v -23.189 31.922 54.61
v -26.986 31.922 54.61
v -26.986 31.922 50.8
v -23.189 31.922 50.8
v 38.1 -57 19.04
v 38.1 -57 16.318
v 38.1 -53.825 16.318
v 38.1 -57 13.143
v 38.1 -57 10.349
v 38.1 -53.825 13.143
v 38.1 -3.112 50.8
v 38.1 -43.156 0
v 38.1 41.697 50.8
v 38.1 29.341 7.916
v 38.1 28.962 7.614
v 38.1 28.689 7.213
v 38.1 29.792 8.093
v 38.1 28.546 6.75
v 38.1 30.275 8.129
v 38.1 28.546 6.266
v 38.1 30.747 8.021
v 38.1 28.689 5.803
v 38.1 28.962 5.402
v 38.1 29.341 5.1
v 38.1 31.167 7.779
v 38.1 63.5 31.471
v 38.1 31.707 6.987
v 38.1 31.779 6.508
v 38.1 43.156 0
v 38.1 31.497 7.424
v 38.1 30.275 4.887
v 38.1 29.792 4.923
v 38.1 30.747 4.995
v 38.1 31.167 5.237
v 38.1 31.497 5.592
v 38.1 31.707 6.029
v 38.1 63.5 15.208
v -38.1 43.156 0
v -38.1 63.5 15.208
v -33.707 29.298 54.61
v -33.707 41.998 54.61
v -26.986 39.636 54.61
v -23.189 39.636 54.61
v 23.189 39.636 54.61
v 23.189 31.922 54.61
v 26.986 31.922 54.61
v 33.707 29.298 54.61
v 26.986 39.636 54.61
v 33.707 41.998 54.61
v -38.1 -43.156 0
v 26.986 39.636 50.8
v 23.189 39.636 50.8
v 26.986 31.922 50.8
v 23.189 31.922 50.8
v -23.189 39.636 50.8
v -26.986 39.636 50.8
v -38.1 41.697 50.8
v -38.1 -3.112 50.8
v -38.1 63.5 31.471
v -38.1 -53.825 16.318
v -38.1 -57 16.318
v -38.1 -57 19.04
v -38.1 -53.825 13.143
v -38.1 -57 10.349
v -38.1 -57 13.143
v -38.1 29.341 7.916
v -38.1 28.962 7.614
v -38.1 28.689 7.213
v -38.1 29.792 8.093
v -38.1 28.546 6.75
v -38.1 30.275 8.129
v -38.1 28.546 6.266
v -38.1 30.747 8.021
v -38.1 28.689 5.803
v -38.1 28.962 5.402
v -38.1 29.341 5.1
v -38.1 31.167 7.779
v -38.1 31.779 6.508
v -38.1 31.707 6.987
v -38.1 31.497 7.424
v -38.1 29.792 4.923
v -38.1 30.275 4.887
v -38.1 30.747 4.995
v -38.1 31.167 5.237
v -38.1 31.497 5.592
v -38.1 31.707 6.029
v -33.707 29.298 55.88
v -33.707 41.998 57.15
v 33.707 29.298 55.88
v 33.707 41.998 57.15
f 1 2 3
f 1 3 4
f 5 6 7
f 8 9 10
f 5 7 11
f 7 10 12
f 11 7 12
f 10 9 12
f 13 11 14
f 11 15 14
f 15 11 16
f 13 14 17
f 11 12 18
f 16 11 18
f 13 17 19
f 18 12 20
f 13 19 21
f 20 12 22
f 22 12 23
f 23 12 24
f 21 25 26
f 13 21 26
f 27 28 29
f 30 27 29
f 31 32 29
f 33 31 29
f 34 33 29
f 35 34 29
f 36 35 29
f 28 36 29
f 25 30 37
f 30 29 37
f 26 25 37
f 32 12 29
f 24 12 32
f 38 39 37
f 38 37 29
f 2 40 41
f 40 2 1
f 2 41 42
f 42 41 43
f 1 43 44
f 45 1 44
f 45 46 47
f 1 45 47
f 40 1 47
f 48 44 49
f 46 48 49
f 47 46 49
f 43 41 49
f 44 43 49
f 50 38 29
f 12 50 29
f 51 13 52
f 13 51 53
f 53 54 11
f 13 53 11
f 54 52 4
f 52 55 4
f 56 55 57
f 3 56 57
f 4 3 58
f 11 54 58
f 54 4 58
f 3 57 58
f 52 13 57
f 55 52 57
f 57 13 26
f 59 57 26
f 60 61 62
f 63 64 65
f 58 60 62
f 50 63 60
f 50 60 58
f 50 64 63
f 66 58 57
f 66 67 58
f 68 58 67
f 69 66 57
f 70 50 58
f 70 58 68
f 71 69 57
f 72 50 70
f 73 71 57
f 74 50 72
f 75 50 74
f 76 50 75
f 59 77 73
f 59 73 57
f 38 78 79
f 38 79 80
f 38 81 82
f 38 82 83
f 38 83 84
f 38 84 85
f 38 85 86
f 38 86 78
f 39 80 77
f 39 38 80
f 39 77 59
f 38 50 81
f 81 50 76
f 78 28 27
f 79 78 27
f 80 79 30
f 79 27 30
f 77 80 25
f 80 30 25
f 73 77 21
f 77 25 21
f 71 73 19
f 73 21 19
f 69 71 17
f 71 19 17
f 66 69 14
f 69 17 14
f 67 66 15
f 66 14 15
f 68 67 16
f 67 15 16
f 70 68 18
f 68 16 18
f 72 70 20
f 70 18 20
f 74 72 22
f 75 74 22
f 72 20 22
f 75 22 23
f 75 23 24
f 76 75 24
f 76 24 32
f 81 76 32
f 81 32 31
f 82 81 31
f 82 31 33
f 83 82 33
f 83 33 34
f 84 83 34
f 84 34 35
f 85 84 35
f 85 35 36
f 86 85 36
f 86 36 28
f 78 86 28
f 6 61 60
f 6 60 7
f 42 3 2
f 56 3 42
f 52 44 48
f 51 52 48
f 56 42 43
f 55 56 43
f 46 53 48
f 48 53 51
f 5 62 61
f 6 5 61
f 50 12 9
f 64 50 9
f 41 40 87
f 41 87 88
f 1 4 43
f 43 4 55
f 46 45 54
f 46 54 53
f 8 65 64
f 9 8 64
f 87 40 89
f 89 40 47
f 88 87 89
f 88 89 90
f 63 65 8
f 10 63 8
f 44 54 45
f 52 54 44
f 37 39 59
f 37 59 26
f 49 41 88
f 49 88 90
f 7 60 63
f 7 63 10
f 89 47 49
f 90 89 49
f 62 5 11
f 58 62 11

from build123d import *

# Parameters (mm, degrees)
F0_W      = 76.2
F0_H      = 127
F1_DEPTH  = 25.4
F2_W      = 76.2
F2_H      = 60.3884999398
F3_DEPTH  = 25.4
F5_DEPTH  = 25.4
F7_W      = 3.7973541766
F7_H      = 7.7133737504
F8_DEPTH  = 3.81
F9_W      = 67.4144178629
F9_H      = 12.7
F10_DEPTH = 2.54
F11_DEPTH = 25.4
F13_DEPTH = 119.38
F14_DEPTH = 157.988
F16_DEPTH = 160.7312
F18_DEPTH = 107.442
F19_DEPTH = 146.05
F22_DEPTH = 175.514
F23_R     = 1.6256
F24_DEPTH = 94.742
F25_W     = 85.8990699053
F25_H     = 3.175
F26_DEPTH = 3.175


with BuildPart() as f1:
    # F0 (on Top) → F1 (new body)
    with BuildSketch(Plane.XY):
        Rectangle(F0_W, F0_H)
    extrude(amount=F1_DEPTH)

    # F2 (on face) → F3 (join)
    with BuildSketch(Plane.XY.offset(25.4)):
        with Locations((0, -33.3057500301)):
            Rectangle(F2_W, F2_H)
    extrude(amount=F3_DEPTH)

    # F5 (add): a face of the model
    f5_faces = [f1.faces().sort_by_distance(p)[0] for p in [
        (0, 30.1942499699, 25.4),
    ]]
    extrude(f5_faces, amount=F5_DEPTH)

    # F7 (on face) → F8 (join)
    with BuildSketch(Plane.XY.offset(50.8)):
        with Locations((25.0877095386, 35.7790123671)):
            Rectangle(F7_W, F7_H)
        with Locations((-25.0877095386, 35.7790123671)):
            Rectangle(F7_W, F7_H)
    extrude(amount=F8_DEPTH)

    # F9 (on face) → F10 (join)
    with BuildSketch(Plane.XY.offset(54.61)):
        with Locations((0, 35.6483589858)):
            Rectangle(F9_W, F9_H)
    extrude(amount=F10_DEPTH)

    # F4 (on face) → F11 (join)
    with BuildSketch(Plane.YZ.offset(38.1)):
        Polygon((-63.5, 15.2083775029), (-3.1115000602, 50.8), (-63.5, 50.8), align=None)
    extrude(amount=F11_DEPTH)

    # F12 (on face) → F13 (cut)
    with BuildSketch(Plane.YZ.offset(63.5)):
        Polygon((-63.5, 50.8), (-63.5, 15.2083775029), (-3.1115000602, 50.8), align=None)
    extrude(amount=-F13_DEPTH, mode=Mode.SUBTRACT)

    # F6 (on face) → F14 (cut)
    with BuildSketch(Plane.YZ.offset(38.1)):
        Polygon((63.5, 50.8), (41.696511209, 50.8), (63.5, 31.4713791013), align=None)
    extrude(amount=-F14_DEPTH, mode=Mode.SUBTRACT)

    # F15 (on face) → F16 (cut)
    with BuildSketch(Plane.YZ.offset(33.7072089314)):
        Polygon((29.2983589858, 57.15), (29.2983589858, 55.88), (41.9983589858, 57.15), align=None)
    extrude(amount=-F16_DEPTH, mode=Mode.SUBTRACT)

    # F17 (on face) → F18 (cut)
    with BuildSketch(Plane.YZ.offset(38.1)):
        Polygon((-43.156321529, 0), (-63.5, 15.2083775029), (-63.5, 0), align=None)
    extrude(amount=-F18_DEPTH, mode=Mode.SUBTRACT)

    # F17 (on face) → F19 (cut)
    with BuildSketch(Plane.YZ.offset(38.1)):
        Polygon((63.5, 0), (63.5, 15.2083775029), (43.156321529, 0), align=None)
    extrude(amount=-F19_DEPTH, mode=Mode.SUBTRACT)

    # F21 (on face) → F22 (cut)
    with BuildSketch(Plane(origin=(-38.1, 0, 0), x_dir=(0, -1, 0), z_dir=(-1, 0, 0))):
        Polygon((67.4441531301, 13.2313063368), (56.999605149, 24.4063157588), (56.999605149, 6.1304802075), align=None)
    extrude(amount=-F22_DEPTH, mode=Mode.SUBTRACT)

    # F23 (on face) → F24 (cut)
    with BuildSketch(Plane.YZ.offset(38.1)):
        with Locations((30.1535148174, 6.5081091598)):
            Circle(F23_R)
    extrude(amount=-F24_DEPTH, mode=Mode.SUBTRACT)

    # F25 (on face) → F26 (cut)
    with BuildSketch(Plane.XZ.offset(56.999605149)):
        with Locations((0, 14.730398621)):
            Rectangle(F25_W, F25_H)
    extrude(amount=-F26_DEPTH, mode=Mode.SUBTRACT)


solid = f1.part
